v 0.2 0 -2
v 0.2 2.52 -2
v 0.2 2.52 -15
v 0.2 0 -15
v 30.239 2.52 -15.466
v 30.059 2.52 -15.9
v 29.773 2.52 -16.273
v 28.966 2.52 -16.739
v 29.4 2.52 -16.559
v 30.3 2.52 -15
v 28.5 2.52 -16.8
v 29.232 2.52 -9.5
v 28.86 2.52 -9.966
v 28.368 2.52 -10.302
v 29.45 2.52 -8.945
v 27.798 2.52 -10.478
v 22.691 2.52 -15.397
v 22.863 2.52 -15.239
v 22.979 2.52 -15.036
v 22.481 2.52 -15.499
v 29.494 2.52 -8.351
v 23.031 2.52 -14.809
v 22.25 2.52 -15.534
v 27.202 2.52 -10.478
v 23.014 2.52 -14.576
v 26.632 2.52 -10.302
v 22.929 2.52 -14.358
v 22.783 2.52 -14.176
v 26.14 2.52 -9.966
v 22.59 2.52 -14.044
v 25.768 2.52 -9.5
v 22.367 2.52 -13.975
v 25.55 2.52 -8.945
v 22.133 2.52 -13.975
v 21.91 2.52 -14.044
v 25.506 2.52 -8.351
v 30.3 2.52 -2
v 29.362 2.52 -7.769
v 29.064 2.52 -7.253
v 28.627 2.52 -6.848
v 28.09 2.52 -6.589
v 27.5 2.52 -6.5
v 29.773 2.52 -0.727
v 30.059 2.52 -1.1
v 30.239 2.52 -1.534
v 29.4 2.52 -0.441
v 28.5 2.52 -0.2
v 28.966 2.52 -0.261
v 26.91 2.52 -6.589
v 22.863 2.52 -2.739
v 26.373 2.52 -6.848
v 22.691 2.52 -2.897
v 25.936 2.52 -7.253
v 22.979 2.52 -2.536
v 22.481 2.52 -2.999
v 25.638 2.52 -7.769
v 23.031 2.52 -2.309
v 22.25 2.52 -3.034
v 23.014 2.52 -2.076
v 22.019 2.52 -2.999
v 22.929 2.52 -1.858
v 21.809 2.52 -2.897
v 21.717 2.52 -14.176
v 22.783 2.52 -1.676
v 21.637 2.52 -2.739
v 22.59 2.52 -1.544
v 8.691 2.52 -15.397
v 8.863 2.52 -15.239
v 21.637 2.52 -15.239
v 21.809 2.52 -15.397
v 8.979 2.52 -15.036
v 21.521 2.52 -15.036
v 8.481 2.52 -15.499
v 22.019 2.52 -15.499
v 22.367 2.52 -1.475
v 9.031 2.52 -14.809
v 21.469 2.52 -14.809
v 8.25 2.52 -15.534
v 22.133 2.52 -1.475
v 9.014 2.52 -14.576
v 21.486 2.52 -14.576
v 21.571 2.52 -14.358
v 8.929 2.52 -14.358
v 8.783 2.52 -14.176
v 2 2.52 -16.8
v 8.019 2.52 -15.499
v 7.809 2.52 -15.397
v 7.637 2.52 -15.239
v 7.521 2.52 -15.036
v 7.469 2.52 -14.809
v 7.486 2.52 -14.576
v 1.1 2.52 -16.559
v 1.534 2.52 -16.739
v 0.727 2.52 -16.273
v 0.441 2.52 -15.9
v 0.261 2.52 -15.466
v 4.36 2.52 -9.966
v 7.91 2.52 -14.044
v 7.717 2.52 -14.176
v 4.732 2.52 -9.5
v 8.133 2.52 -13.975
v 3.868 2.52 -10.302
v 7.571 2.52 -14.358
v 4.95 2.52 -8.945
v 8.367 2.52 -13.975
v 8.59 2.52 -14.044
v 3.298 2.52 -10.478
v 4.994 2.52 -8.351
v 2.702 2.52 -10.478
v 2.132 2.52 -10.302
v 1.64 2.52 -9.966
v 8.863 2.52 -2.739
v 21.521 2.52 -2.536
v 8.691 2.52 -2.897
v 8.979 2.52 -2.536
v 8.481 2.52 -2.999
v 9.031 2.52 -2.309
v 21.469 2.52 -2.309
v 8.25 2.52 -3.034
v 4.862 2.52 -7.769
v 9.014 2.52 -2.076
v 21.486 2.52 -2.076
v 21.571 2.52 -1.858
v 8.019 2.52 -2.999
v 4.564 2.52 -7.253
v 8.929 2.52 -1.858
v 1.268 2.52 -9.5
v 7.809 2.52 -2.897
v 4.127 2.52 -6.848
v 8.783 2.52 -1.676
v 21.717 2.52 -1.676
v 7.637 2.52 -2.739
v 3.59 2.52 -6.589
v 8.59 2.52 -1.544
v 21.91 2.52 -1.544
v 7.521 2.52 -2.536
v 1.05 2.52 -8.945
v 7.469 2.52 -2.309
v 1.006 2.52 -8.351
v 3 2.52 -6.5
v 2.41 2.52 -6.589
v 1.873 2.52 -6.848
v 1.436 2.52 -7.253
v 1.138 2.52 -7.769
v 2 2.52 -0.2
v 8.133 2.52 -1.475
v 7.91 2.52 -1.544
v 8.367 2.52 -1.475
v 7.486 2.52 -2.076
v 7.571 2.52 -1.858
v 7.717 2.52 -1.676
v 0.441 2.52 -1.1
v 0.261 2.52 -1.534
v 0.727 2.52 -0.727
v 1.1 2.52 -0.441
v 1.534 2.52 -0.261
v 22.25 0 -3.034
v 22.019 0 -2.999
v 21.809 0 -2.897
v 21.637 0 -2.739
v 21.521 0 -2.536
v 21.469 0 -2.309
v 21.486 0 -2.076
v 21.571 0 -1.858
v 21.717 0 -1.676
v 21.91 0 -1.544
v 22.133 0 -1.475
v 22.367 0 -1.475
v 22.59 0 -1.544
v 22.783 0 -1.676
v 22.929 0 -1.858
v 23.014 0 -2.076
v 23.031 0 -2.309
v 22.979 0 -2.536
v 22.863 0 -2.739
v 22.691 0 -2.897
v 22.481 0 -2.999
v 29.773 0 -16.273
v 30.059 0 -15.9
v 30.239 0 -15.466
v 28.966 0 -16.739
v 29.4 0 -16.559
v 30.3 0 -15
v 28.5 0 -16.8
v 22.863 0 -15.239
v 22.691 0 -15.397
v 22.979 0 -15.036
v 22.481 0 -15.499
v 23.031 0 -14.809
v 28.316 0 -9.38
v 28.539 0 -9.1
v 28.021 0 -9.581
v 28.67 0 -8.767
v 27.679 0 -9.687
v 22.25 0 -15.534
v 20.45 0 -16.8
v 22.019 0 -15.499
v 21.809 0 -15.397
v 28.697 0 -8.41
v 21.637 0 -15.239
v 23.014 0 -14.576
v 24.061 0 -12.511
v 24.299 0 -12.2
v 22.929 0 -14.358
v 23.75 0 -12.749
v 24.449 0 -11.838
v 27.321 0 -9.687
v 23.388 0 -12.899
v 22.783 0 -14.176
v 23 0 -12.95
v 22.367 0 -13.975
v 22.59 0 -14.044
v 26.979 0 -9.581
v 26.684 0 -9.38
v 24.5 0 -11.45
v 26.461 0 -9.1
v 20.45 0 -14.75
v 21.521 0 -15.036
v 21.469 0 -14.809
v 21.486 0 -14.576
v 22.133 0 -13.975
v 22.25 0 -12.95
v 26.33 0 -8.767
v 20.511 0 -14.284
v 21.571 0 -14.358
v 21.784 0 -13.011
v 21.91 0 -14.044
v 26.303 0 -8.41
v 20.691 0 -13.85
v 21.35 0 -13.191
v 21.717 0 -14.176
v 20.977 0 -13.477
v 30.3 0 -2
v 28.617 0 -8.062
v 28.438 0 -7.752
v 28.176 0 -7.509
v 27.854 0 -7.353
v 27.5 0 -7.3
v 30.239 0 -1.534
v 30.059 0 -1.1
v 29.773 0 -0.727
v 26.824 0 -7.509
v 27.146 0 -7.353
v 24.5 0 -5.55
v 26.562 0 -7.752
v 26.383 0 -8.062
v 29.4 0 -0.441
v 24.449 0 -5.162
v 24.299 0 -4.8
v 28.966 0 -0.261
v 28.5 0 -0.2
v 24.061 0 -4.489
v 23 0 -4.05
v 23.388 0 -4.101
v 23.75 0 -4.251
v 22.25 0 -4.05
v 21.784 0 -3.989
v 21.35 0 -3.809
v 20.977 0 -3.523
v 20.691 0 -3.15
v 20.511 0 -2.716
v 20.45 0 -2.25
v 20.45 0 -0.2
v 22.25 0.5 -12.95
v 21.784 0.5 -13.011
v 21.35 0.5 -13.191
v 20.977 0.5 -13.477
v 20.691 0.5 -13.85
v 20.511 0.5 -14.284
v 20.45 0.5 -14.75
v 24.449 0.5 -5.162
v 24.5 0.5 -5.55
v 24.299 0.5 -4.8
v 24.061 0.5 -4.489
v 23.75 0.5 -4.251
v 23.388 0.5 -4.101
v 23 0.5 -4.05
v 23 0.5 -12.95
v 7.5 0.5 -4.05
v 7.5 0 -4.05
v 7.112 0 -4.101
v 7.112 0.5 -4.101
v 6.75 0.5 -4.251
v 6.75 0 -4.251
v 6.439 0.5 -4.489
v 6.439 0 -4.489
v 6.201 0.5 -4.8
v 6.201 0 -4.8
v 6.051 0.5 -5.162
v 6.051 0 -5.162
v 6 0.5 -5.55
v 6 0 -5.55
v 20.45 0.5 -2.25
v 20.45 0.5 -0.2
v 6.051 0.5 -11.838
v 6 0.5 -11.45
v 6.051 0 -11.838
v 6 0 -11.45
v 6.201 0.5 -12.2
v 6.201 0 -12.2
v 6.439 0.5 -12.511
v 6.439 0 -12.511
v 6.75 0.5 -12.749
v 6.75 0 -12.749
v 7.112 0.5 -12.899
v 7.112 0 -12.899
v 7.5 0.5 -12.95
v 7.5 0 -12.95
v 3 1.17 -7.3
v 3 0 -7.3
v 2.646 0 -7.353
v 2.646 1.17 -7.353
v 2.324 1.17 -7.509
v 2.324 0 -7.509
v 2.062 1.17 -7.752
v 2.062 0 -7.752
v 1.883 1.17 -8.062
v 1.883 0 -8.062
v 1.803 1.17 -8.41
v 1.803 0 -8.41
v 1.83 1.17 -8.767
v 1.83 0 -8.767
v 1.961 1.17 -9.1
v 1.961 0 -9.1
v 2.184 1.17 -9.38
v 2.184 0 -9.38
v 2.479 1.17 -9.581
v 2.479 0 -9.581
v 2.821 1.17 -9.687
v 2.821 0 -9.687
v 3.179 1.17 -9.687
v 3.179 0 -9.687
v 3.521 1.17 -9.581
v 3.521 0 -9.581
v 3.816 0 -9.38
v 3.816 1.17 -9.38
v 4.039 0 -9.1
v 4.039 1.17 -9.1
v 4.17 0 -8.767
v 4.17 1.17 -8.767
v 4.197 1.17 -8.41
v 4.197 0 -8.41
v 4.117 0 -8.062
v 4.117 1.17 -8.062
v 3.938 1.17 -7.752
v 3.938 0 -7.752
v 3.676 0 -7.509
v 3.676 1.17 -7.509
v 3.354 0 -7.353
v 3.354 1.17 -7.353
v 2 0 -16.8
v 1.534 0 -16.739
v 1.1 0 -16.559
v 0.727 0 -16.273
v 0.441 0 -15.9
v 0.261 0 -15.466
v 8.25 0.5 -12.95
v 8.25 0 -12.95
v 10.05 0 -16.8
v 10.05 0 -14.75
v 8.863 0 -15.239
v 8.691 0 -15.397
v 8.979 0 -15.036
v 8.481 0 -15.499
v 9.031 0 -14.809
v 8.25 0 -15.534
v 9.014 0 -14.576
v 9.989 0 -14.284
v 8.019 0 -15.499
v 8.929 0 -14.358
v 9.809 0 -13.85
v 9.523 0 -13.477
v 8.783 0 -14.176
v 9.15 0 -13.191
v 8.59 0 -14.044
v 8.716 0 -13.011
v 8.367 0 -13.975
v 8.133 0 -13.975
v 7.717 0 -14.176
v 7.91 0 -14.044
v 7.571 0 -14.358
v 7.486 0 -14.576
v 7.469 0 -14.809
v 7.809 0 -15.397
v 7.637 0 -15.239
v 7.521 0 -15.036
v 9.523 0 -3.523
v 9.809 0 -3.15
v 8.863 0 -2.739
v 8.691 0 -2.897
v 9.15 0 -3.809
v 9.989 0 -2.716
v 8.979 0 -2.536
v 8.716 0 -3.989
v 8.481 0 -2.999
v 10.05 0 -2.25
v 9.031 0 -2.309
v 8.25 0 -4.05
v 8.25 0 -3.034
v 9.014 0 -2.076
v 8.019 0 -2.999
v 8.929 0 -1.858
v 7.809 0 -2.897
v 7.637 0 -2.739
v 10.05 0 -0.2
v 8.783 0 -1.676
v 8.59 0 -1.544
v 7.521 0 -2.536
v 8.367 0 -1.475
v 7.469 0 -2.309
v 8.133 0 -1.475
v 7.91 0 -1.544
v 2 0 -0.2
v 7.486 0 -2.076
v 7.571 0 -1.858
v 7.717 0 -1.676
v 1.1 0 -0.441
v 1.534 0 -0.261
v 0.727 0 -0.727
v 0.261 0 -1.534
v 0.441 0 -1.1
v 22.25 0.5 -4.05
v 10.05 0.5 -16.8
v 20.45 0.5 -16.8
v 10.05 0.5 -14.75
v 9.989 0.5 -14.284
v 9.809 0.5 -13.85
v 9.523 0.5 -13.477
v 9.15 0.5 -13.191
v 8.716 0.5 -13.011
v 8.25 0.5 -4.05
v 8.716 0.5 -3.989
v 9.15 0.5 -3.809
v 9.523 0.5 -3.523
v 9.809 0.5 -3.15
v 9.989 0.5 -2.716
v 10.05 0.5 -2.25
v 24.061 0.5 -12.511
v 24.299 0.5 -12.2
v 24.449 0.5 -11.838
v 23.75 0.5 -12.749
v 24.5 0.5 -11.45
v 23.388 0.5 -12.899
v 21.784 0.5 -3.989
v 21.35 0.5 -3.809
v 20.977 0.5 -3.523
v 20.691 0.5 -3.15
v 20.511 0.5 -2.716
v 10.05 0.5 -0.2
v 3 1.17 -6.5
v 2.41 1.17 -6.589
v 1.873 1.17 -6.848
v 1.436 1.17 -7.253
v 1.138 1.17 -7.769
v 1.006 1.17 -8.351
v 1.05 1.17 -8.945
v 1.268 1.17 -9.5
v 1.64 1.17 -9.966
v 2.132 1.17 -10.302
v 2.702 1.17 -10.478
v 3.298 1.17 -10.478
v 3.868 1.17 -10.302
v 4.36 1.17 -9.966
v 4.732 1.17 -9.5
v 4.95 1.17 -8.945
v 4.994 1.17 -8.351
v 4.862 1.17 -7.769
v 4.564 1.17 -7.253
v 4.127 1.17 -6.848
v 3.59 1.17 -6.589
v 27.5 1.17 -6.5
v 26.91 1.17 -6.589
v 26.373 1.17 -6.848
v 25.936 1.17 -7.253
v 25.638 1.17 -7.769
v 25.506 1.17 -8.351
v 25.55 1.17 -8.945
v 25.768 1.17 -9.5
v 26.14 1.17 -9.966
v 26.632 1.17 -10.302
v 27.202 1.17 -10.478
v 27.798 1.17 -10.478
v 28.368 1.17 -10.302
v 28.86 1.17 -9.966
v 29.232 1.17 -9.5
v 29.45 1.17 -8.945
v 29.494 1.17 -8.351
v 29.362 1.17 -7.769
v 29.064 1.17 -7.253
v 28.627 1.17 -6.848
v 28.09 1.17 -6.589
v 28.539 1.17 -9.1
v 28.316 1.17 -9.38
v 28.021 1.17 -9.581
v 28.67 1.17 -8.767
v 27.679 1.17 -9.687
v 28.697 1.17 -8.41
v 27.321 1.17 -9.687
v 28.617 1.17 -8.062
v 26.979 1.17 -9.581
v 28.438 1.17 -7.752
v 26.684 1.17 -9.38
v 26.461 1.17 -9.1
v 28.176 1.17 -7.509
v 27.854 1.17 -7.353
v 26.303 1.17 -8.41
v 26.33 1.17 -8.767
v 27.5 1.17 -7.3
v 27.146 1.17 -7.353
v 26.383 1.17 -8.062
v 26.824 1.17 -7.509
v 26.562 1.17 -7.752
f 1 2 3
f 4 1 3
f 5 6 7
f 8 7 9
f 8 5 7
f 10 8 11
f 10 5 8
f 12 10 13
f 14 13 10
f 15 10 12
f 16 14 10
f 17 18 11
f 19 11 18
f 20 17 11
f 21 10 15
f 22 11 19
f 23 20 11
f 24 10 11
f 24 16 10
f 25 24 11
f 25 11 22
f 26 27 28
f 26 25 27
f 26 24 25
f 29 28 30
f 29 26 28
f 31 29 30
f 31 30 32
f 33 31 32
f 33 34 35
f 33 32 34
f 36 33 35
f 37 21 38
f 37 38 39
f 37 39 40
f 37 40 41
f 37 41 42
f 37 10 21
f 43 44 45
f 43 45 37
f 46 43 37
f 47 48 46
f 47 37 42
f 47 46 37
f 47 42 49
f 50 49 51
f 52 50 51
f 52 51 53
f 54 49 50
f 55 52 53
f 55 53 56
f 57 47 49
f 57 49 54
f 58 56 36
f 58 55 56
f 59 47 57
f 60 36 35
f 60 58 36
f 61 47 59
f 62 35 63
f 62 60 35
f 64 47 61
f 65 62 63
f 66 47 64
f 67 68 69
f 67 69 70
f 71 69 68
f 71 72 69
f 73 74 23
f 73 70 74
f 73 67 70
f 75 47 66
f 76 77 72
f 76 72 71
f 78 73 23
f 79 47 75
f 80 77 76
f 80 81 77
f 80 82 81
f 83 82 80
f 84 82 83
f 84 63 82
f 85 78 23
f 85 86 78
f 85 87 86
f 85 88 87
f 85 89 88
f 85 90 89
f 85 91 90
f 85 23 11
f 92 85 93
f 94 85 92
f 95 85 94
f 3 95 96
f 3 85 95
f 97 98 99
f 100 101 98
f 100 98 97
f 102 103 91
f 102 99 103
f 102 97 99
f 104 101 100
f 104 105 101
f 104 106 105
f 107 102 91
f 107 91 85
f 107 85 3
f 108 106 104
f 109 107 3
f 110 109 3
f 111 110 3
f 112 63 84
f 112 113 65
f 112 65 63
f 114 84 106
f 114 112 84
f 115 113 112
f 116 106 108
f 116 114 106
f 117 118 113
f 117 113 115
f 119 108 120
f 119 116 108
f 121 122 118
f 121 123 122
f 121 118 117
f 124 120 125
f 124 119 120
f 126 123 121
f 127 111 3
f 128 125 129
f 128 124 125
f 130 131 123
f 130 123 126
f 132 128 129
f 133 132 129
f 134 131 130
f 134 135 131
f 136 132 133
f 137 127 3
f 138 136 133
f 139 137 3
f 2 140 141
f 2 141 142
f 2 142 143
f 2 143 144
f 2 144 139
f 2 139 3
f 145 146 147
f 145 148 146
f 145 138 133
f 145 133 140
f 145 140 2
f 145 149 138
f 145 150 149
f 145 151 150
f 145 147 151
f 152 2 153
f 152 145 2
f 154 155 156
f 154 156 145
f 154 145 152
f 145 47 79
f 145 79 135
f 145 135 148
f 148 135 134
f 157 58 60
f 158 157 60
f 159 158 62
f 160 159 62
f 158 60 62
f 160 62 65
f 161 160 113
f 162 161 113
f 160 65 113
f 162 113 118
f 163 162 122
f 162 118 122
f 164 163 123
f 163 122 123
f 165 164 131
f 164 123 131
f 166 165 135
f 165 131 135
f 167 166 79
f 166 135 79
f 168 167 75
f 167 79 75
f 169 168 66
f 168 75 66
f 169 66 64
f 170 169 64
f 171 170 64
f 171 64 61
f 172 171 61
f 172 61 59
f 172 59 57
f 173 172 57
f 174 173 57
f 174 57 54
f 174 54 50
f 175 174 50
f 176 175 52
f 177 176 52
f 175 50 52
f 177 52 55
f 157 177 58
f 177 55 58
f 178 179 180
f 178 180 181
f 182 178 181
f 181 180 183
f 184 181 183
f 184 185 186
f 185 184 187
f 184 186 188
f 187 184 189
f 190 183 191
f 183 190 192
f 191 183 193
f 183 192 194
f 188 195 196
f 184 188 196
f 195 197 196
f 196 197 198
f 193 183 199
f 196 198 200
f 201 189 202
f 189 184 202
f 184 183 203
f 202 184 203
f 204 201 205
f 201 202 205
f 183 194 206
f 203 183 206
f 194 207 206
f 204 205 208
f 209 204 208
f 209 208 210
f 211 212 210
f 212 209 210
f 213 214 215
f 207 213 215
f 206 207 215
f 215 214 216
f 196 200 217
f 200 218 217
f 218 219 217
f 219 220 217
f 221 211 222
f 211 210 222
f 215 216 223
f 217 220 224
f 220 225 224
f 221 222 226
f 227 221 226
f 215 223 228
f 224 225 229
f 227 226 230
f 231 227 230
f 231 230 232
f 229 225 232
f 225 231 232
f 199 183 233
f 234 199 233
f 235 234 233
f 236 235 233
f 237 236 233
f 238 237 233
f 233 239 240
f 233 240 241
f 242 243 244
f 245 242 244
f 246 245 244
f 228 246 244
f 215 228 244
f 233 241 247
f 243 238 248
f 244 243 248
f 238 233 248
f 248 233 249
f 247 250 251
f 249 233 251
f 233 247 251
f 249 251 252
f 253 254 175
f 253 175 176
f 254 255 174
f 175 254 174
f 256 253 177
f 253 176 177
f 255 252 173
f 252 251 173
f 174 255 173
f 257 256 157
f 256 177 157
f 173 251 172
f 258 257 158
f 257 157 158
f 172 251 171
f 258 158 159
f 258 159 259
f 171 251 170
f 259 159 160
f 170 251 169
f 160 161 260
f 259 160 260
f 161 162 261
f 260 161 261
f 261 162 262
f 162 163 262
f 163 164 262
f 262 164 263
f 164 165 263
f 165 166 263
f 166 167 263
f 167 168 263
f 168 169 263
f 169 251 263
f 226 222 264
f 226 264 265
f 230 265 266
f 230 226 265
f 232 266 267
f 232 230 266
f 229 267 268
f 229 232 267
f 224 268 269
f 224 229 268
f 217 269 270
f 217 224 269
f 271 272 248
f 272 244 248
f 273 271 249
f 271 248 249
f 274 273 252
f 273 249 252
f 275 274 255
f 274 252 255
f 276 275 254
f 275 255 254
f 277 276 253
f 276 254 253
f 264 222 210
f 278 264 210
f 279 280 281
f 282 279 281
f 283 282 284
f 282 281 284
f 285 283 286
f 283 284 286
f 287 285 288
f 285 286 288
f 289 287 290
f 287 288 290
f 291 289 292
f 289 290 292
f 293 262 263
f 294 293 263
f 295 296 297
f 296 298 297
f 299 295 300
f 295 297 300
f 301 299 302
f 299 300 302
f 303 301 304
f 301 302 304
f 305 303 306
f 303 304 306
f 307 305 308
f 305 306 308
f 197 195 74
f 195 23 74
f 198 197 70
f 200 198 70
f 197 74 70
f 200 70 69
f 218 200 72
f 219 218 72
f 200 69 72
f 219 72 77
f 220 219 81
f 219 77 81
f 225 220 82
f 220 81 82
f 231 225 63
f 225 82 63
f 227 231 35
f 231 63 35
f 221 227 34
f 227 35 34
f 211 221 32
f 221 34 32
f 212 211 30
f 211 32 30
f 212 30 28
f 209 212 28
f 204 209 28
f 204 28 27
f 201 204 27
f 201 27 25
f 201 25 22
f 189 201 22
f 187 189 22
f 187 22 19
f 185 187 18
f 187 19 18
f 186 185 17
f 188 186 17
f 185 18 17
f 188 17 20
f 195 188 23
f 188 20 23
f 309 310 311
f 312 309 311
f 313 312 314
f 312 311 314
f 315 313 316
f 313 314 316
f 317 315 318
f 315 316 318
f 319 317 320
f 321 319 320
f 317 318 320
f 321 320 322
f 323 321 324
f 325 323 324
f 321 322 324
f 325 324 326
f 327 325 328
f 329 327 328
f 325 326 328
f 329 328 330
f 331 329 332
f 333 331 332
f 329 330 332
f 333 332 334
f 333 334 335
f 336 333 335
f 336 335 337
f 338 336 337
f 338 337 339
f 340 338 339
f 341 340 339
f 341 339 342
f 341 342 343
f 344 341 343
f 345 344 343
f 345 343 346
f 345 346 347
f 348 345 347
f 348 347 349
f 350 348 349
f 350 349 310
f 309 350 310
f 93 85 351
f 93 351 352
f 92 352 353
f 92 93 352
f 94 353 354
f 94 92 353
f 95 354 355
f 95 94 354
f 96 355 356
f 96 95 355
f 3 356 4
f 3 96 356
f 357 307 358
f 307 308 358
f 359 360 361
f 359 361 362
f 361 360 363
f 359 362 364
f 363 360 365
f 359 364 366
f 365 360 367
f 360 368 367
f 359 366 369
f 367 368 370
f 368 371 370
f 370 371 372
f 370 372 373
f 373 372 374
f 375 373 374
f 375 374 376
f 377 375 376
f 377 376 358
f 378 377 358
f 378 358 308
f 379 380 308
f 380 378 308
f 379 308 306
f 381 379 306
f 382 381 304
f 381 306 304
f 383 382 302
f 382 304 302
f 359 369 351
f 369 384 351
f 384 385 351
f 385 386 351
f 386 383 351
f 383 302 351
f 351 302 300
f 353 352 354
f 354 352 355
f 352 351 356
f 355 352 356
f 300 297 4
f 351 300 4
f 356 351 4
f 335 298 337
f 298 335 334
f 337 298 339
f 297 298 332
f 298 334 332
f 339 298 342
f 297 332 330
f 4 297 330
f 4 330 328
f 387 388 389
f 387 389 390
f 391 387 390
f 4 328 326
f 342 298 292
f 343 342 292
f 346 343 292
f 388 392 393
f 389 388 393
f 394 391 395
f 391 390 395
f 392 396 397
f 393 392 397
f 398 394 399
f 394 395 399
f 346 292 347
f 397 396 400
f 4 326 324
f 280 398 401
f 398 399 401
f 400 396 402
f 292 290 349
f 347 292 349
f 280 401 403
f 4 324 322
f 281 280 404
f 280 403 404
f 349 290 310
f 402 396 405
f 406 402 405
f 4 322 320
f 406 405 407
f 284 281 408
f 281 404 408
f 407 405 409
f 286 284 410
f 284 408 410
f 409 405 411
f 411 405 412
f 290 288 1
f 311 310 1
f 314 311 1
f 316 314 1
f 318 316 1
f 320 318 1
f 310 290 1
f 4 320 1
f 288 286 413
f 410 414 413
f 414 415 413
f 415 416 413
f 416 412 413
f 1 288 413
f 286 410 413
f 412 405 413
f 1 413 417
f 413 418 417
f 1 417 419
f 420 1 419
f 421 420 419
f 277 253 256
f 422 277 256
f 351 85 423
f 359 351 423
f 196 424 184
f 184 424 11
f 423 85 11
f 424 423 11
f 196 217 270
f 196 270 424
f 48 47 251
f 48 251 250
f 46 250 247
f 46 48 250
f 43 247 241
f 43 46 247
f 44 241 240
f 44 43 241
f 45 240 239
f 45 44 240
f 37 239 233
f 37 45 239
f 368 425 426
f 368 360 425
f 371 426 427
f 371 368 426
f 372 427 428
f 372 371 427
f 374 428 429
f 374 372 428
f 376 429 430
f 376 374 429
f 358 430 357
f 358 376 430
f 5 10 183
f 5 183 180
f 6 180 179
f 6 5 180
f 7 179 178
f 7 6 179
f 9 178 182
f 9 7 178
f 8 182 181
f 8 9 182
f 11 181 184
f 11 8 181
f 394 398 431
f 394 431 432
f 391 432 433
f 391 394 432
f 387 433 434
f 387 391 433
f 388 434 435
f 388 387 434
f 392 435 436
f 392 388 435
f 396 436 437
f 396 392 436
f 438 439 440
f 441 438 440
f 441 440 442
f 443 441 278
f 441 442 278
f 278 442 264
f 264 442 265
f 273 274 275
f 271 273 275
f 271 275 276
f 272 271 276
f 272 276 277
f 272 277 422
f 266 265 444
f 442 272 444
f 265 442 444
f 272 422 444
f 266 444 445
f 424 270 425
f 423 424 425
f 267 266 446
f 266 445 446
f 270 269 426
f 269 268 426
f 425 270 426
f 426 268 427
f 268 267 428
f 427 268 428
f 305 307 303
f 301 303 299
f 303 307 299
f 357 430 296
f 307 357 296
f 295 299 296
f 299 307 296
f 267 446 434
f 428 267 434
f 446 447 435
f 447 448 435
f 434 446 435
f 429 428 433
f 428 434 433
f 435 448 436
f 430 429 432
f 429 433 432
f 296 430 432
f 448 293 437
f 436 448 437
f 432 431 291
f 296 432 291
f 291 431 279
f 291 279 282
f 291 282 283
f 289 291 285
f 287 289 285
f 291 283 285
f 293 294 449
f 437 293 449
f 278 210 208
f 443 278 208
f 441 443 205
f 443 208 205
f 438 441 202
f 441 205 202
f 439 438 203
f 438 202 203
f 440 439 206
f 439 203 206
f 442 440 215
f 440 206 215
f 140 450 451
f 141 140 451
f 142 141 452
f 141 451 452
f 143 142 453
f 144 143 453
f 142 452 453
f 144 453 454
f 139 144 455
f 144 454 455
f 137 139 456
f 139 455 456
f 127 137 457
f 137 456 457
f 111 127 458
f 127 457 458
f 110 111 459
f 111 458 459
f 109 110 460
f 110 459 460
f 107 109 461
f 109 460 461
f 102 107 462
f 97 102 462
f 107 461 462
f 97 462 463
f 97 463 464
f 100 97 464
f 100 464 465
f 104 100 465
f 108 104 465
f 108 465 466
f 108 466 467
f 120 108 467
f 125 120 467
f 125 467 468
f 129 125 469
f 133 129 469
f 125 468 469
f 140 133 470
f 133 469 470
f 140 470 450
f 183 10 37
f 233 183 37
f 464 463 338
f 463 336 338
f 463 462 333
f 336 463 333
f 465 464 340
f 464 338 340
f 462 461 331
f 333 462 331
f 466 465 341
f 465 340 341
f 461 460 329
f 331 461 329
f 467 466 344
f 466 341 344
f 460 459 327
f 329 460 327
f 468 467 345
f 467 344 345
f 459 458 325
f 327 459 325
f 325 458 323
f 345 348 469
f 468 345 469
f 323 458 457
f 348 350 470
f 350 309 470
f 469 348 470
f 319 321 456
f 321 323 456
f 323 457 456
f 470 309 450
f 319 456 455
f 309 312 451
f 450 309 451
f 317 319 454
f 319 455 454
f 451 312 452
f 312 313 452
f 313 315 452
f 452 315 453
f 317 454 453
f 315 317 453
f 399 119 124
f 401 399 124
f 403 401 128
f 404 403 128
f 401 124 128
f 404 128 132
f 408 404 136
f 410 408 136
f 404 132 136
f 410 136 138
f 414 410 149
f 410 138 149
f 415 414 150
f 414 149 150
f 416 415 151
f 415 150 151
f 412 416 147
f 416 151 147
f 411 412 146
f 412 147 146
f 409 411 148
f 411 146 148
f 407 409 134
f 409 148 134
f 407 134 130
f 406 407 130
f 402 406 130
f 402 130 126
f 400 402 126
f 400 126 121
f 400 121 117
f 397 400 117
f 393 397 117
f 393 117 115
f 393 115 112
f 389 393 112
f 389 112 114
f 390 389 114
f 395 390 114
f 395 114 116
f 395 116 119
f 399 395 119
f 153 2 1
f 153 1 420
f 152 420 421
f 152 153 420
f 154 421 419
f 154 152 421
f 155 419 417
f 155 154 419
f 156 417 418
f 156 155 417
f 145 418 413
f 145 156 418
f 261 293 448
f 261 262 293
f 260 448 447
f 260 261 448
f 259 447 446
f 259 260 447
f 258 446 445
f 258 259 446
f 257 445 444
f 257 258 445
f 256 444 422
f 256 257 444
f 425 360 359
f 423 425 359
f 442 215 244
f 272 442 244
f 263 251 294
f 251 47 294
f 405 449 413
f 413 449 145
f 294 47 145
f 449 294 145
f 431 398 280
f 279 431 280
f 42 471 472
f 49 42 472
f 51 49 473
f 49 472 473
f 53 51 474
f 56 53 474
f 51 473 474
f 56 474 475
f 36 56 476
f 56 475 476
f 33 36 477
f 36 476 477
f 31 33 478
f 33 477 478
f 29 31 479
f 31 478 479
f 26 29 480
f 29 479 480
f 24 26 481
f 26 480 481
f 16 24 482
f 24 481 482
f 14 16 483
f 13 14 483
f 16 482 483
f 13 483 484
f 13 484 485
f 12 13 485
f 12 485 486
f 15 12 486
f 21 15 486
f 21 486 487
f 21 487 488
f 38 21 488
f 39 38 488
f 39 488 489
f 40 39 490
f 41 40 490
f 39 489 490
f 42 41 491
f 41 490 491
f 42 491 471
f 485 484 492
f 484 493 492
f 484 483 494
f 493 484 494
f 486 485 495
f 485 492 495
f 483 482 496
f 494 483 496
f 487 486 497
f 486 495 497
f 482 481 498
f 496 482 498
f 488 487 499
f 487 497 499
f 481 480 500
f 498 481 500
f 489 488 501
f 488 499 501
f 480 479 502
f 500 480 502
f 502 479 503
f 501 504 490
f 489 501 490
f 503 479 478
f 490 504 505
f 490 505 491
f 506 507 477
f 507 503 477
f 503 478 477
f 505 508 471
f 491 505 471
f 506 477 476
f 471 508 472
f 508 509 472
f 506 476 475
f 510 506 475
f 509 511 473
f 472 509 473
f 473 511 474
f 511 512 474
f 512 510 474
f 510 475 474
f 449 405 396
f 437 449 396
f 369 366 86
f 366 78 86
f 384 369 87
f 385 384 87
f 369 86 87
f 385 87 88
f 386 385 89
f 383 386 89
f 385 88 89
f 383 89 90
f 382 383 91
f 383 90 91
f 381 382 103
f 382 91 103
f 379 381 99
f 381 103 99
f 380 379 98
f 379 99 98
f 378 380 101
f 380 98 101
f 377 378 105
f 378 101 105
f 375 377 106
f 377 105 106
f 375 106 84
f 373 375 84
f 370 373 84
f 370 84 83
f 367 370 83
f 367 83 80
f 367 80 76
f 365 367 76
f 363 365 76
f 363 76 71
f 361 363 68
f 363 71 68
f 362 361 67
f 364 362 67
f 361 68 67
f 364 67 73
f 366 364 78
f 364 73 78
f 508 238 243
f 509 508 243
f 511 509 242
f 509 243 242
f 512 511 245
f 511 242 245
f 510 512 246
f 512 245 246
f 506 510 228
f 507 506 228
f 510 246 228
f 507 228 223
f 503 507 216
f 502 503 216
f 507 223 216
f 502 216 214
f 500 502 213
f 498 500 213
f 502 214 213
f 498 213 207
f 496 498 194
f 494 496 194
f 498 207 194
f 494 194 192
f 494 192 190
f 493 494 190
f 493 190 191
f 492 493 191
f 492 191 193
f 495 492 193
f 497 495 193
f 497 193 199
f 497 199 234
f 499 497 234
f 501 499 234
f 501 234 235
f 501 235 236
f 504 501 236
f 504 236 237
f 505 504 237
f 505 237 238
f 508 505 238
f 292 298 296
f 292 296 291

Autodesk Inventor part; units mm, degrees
ref_plane "YZ Plane" through (0, 0, 0) normal (1, 0, 0) x (0, 1, 0)
ref_plane "XZ Plane" through (0, 0, 0) normal (0, 1, 0) x (-1, 0, 0)
ref_plane "Work Plane1" through (0, 0, 0) normal (0, -1, 0) x (1, 0, 0)
sketch "Sketch7" plane through (0, 0, 0) normal (0, 1, 0) x (-1, 0, 0)
  arc A0 (-2, -17) -> (0, -15) centre (-2, -15) ccw
  line L0 (0, -15) -> (0, -2)
  arc A1 (0, -2) -> (-2, 0) centre (-2, -2) ccw
  line L1 (-2, 0) -> (-8.25, 0)
  arc A2 (-6, -2.25) -> (-8.25, 0) centre (-8.25, -2.25) ccw
  line L2 (-6, -14.75) -> (-6, -2.25)
  arc A3 (-8.25, -17) -> (-6, -14.75) centre (-8.25, -14.75) ccw
  line L3 (-8.25, -17) -> (-2, -17)
  line L4 (-22.25, 0) -> (-8.25, 0)
  arc A4 (-22.25, 0) -> (-24.5, -2.25) centre (-22.25, -2.25) ccw
  line L5 (-24.5, -14.75) -> (-24.5, -2.25)
  arc A5 (-24.5, -14.75) -> (-22.25, -17) centre (-22.25, -14.75) ccw
  line L6 (-8.25, -17) -> (-22.25, -17)
  arc A6 (-8.25, -17) -> (-6, -14.75) centre (-8.25, -14.75) ccw
  line L7 (-6, -2.25) -> (-6, -14.75)
  arc A7 (-6, -2.25) -> (-8.25, 0) centre (-8.25, -2.25) ccw
  arc A8 (-28.5, 0) -> (-30.5, -2) centre (-28.5, -2) ccw
  line L8 (-30.5, -2) -> (-30.5, -15)
  arc A9 (-30.5, -15) -> (-28.5, -17) centre (-28.5, -15) ccw
  line L9 (-28.5, -17) -> (-22.25, -17)
  arc A10 (-24.5, -14.75) -> (-22.25, -17) centre (-22.25, -14.75) ccw
  line L10 (-24.5, -2.25) -> (-24.5, -14.75)
  arc A11 (-22.25, 0) -> (-24.5, -2.25) centre (-22.25, -2.25) ccw
  line L11 (-22.25, 0) -> (-28.5, 0)
  line L12 (-23, -4.05) -> (-22.25, -4.05)
  arc A12 (-22.25, -4.05) -> (-20.45, -2.25) centre (-22.25, -2.25) ccw
  line L13 (-20.45, -2.25) -> (-20.45, -1.5)
  arc A13 (-18.95, 0) -> (-20.45, -1.5) centre (-18.95, -1.5) ccw
  line L14 (-18.95, 0) -> (-22.25, 0)
  arc A14 (-22.25, 0) -> (-24.5, -2.25) centre (-22.25, -2.25) ccw
  line L15 (-24.5, -2.25) -> (-24.5, -5.55)
  arc A15 (-23, -4.05) -> (-24.5, -5.55) centre (-23, -5.55) ccw
  circle A16 centre (-22.25, -2.25) radius 0.8
  line L16 (-8.25, -4.05) -> (-7.5, -4.05)
  arc A17 (-6, -5.55) -> (-7.5, -4.05) centre (-7.5, -5.55) ccw
  line L17 (-6, -5.55) -> (-6, -2.25)
  arc A18 (-6, -2.25) -> (-8.25, 0) centre (-8.25, -2.25) ccw
  line L18 (-8.25, 0) -> (-11.55, 0)
  arc A19 (-10.05, -1.5) -> (-11.55, 0) centre (-11.55, -1.5) ccw
  line L19 (-10.05, -1.5) -> (-10.05, -2.25)
  arc A20 (-10.05, -2.25) -> (-8.25, -4.05) centre (-8.25, -2.25) ccw
  circle A21 centre (-8.25, -2.25) radius 0.8
  line L20 (-10.05, -14.75) -> (-10.05, -15.5)
  arc A22 (-11.55, -17) -> (-10.05, -15.5) centre (-11.55, -15.5) ccw
  line L21 (-11.55, -17) -> (-8.25, -17)
  arc A23 (-8.25, -17) -> (-6, -14.75) centre (-8.25, -14.75) ccw
  line L22 (-6, -14.75) -> (-6, -11.45)
  arc A24 (-7.5, -12.95) -> (-6, -11.45) centre (-7.5, -11.45) ccw
  line L23 (-7.5, -12.95) -> (-8.25, -12.95)
  arc A25 (-8.25, -12.95) -> (-10.05, -14.75) centre (-8.25, -14.75) ccw
  circle A26 centre (-8.25, -14.75) radius 0.8
  line L24 (-22.25, -12.95) -> (-23, -12.95)
  arc A27 (-24.5, -11.45) -> (-23, -12.95) centre (-23, -11.45) ccw
  line L25 (-24.5, -11.45) -> (-24.5, -14.75)
  arc A28 (-24.5, -14.75) -> (-22.25, -17) centre (-22.25, -14.75) ccw
  line L26 (-22.25, -17) -> (-18.95, -17)
  arc A29 (-20.45, -15.5) -> (-18.95, -17) centre (-18.95, -15.5) ccw
  line L27 (-20.45, -15.5) -> (-20.45, -14.75)
  arc A30 (-20.45, -14.75) -> (-22.25, -12.95) centre (-22.25, -14.75) ccw
  circle A31 centre (-22.25, -14.75) radius 0.8
  line L28 (-10.05, -1.5) -> (-10.05, 0)
  line L29 (-10.05, -15.5) -> (-10.05, -17)
  line L30 (-20.45, -15.5) -> (-20.45, -17)
  line L31 (-20.45, -1.5) -> (-20.45, 0)
  point P0 (0, 0)
  point P1 (145.09, 90.0262)
  point P2 (-71.3045, 9.3)
  point P3 (-8.25, 0)
  point P4 (-6, -5.55)
extrude "Extrusion5" add sketch "Sketch7" along normal blind 2.52 contours L3 A3 L2 A2 L1 A1 L0 A0 | L6 L29 L20 A25 L23 A24 L2 A3 | L6 A22 L29 | A24 L23 A25 L20 A22 L6 A29 L27 A30 L24 A27 L5 A15 L12 A12 L13 A13 L4 A19 L19 A20 L16 A17 L2 | A2 L2 A17 L16 A20 L19 L28 L4 | L6 L30 A29 | L28 A19 L4 | L6 A5 L5 A27 L24 A30 L27 L30 | L9 A9 L8 A8 L11 A4 L5 A5 | A13 L31 L4 | L31 L13 A12 L12 A15 L5 A4 L4 | A16 | A21 | A26 | A31
extrude "Extrusion6" cut sketch "Sketch7" along normal blind 0.5 contours L6 A22 L29 | A24 L23 A25 L20 A22 L6 A29 L27 A30 L24 A27 L5 A15 L12 A12 L13 A13 L4 A19 L19 A20 L16 A17 L2 | L6 L30 A29 | L28 A19 L4 | A13 L31 L4
sketch "Sketch8" plane through (0, 2.52, 0) normal (0, 1, 0) x (1, 0, 0)
  arc A0 (0, 2) -> (2, 0) centre (2, 2) ccw projected
  line L0 (2, 0) -> (28.5, 0) projected
  arc A1 (28.5, 0) -> (30.5, 2) centre (28.5, 2) ccw projected
  line L1 (30.5, 2) -> (30.5, 15) projected
  arc A2 (30.5, 15) -> (28.5, 17) centre (28.5, 15) ccw projected
  line L2 (28.5, 17) -> (2, 17) projected
  arc A3 (2, 17) -> (0, 15) centre (2, 15) ccw projected
  line L3 (0, 15) -> (0, 2) projected
  line L4 (2, 16.8) -> (28.5, 16.8)
  arc A4 (30.3, 15) -> (28.5, 16.8) centre (28.5, 15) ccw
  line L5 (30.3, 15) -> (30.3, 2)
  arc A5 (28.5, 0.2) -> (30.3, 2) centre (28.5, 2) ccw
  line L6 (28.5, 0.2) -> (2, 0.2)
  arc A6 (0.2, 2) -> (2, 0.2) centre (2, 2) ccw
  line L7 (0.2, 2) -> (0.2, 15)
  arc A7 (2, 16.8) -> (0.2, 15) centre (2, 15) ccw
  point P0 (0, 0)
  dimension "d32" = 0.2
extrude "Extrusion7" cut sketch "Sketch8" against normal blind 10
hole "Hole3" at (22.25, 0, -14.75) at (8.25, 0, -14.75) at (8.25, 0, -2.25) at (22.25, 0, -2.25) direction (0, 1, 0) diameter 1.567 depth 3 thread size "M2x0.4" class "6H" standard "ISO Metric profile"
sketch "Sketch10" plane through (0, 2.52, 0) normal (0, 1, 0) x (1, 0, 0)
  line L0 (24.5, 14.75) -> (24.5, 2.25) projected
  line L1 (6, 14.75) -> (6, 2.25) projected
  line L2 (24.5, 5.55) -> (24.5, 11.45) projected
  line L3 (24.5, 8.5) -> (27.5, 8.5)
  line L4 (6, 11.45) -> (6, 5.55) projected
  line L5 (6, 8.5) -> (3, 8.5)
  point P0 (0, 0)
  dimension "d42" = 3
  dimension "d43" = 3
hole "Hole4" at (27.5, 2.52, -8.5) at (3, 2.52, -8.5) direction (0, -1, 0) diameter 2.4 depth 3 counterbore diameter 4 counterbore depth 1.35
properties part number "2021-01-011"
